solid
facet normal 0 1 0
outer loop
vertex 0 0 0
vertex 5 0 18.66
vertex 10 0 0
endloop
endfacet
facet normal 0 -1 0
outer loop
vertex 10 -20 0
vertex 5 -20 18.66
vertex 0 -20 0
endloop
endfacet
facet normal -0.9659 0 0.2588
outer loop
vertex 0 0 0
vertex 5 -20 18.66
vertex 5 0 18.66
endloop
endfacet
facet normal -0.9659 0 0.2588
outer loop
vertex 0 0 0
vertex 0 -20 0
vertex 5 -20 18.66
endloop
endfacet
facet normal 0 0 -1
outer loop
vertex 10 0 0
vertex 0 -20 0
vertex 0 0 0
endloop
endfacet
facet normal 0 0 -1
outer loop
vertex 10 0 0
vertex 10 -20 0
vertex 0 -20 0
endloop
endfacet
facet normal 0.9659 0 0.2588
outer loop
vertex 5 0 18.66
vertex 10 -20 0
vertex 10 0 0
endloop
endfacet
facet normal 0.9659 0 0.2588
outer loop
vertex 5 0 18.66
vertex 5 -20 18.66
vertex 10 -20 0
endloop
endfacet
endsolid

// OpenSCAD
// 30 deg wedge standing on its base, apex up: a convex edge sharper than 45 deg (and nothing else).
rotate([90,0,0]) linear_extrude(20) polygon([[0,0],[10,0],[5,5/tan(15)]]);
